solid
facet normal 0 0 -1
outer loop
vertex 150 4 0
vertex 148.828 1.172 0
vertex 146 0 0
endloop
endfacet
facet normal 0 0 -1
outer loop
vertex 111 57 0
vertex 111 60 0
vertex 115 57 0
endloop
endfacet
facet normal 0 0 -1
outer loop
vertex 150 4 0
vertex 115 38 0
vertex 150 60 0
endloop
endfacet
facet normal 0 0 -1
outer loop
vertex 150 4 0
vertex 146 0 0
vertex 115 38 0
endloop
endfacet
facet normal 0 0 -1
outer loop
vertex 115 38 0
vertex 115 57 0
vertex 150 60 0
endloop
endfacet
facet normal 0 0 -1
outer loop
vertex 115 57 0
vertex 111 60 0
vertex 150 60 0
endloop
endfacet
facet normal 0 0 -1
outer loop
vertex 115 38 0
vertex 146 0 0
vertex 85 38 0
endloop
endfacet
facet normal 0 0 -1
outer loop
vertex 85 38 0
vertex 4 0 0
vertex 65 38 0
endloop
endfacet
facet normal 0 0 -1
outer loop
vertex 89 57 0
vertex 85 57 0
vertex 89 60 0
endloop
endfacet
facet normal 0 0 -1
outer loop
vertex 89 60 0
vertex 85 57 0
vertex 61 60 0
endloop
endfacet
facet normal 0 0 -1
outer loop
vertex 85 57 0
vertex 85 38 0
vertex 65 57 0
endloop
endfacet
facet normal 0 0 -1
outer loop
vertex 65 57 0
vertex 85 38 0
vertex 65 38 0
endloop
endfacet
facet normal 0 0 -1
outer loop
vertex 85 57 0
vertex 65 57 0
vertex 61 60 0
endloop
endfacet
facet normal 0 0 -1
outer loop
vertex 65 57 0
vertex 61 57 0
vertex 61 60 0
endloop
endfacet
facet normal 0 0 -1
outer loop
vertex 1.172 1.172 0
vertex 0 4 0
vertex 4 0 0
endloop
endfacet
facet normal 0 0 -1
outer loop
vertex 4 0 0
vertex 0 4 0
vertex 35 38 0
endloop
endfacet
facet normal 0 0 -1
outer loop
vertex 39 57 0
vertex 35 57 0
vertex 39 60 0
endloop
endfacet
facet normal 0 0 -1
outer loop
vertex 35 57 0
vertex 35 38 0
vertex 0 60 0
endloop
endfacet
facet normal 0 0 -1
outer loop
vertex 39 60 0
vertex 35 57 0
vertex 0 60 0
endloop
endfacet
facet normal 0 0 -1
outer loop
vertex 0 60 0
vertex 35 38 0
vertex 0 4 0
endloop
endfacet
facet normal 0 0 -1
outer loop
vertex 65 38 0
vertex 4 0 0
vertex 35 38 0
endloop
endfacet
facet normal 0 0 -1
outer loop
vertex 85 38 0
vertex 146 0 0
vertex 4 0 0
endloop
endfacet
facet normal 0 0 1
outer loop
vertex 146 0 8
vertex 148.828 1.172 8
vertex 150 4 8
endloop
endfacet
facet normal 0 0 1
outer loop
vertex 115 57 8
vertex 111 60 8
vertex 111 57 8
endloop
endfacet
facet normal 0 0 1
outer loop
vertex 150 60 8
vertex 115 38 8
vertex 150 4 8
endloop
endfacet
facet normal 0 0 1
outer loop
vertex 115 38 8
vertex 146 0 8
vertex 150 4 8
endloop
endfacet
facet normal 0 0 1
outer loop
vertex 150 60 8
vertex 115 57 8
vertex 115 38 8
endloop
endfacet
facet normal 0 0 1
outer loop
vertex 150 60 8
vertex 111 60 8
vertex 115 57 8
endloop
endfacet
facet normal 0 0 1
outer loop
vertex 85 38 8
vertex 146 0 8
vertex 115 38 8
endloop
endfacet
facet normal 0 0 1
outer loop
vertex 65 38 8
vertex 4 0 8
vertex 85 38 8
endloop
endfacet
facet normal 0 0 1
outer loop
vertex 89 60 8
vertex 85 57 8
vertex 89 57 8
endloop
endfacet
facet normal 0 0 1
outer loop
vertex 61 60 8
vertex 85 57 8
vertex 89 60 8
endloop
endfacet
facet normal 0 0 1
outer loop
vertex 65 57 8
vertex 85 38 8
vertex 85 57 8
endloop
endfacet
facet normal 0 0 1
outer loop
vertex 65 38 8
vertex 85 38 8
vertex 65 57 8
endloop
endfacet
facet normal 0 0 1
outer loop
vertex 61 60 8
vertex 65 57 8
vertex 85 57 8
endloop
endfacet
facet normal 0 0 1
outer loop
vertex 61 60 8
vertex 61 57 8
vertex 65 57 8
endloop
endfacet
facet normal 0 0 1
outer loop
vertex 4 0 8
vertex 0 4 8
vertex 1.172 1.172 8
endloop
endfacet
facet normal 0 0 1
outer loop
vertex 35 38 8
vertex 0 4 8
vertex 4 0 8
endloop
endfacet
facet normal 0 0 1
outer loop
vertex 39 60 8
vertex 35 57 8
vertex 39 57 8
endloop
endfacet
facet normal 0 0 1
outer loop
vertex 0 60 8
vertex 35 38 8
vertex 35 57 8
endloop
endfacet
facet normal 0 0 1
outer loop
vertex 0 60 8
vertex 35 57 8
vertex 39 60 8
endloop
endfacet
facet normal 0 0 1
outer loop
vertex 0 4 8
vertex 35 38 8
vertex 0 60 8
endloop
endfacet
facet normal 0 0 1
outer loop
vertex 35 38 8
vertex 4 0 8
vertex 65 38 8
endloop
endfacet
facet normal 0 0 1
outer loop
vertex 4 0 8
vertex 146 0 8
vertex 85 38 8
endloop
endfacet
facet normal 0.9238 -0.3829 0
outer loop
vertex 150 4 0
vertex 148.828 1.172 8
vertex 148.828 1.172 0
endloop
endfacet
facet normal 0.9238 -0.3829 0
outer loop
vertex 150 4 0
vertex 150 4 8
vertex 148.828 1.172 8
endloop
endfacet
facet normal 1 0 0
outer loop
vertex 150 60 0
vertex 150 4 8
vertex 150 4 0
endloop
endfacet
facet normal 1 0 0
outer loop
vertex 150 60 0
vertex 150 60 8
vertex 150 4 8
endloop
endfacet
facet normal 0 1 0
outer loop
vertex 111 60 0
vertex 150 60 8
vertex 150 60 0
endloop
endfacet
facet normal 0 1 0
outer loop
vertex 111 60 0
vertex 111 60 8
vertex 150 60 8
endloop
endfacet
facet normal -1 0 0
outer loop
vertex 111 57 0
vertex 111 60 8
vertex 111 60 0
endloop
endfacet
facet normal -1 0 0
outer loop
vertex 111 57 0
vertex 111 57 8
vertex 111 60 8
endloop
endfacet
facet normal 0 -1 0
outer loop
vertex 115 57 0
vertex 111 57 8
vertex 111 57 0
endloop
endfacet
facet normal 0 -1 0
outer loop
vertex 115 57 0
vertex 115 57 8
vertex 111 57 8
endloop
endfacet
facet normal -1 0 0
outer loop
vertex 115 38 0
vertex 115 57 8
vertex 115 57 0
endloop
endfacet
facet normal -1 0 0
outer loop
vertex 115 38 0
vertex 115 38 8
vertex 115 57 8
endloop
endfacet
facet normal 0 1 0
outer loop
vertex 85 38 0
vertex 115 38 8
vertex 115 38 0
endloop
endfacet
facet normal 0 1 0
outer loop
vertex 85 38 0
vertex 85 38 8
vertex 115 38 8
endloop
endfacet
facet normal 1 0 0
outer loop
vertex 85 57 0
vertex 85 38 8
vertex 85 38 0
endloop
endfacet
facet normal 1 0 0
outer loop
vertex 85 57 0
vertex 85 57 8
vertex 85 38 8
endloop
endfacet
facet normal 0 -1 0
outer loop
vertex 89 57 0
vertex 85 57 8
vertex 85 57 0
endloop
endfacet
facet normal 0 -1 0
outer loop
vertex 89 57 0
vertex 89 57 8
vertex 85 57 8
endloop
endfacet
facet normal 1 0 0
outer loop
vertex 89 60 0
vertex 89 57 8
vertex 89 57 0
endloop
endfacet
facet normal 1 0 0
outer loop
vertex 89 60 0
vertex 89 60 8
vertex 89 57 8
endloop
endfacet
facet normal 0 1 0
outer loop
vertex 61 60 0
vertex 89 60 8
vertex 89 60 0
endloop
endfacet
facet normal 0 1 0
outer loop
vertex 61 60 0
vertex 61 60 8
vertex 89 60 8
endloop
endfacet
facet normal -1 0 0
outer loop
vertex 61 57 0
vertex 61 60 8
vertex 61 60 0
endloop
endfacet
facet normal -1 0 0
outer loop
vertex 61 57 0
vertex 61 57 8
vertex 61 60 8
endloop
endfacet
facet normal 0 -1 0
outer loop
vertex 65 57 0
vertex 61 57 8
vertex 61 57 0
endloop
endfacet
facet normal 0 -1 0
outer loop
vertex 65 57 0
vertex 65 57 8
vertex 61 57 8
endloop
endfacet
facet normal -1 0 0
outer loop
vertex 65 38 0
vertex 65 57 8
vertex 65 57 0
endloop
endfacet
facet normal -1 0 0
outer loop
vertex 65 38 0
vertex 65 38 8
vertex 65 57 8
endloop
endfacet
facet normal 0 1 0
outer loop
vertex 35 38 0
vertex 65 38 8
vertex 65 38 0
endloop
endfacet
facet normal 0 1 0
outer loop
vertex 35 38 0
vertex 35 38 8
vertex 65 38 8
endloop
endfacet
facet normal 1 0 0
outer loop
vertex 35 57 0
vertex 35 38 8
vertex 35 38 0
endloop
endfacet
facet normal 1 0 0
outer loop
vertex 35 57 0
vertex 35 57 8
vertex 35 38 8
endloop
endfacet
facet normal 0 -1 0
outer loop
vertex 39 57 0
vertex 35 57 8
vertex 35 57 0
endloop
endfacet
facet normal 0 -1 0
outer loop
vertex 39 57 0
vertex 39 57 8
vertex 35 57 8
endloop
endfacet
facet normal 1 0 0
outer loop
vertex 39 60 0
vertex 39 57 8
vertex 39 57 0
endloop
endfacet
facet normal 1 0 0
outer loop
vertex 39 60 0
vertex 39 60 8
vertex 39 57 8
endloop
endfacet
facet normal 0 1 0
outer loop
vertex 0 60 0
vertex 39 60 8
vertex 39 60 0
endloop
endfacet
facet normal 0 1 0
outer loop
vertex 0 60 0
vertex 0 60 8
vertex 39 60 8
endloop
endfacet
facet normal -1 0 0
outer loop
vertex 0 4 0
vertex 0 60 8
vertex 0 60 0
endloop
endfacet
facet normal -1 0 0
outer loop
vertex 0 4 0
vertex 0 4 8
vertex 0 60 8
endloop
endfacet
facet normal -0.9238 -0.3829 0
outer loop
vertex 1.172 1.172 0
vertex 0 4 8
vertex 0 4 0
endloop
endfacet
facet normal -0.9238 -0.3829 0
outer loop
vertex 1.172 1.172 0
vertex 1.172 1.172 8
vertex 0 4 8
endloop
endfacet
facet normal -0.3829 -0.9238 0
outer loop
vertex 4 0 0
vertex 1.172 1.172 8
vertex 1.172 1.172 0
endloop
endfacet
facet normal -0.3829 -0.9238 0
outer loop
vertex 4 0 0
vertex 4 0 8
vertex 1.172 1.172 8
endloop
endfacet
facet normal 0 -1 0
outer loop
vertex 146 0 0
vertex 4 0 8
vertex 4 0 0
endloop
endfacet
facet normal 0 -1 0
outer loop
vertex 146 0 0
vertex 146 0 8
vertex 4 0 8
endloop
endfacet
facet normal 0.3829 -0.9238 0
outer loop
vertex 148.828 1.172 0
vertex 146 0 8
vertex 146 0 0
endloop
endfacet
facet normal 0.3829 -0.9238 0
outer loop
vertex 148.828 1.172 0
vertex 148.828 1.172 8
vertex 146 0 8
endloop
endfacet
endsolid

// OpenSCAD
$fn = 32;

// ----------------------------------------------------------------------
// Oversize slot bar: 150 mm bar with 2 oversize windows
// ----------------------------------------------------------------------

// --- parameters (mm) ---
profile_height = 8;       // extrusion height
profile_points = 24;      // points of the closed outline

profile = [[0, 4], [1.172, 1.172], [4, 0], [146, 0], [148.828, 1.172], [150, 4], [150, 60], [111, 60], [111, 57], [115, 57], [115, 38], [85, 38], [85, 57], [89, 57], [89, 60], [61, 60], [61, 57], [65, 57], [65, 38], [35, 38], [35, 57], [39, 57], [39, 60], [0, 60]];  // single closed polygon, 24 points, counter clockwise

// --- the one profile operation ---
linear_extrude(height = profile_height) polygon(points = profile);
